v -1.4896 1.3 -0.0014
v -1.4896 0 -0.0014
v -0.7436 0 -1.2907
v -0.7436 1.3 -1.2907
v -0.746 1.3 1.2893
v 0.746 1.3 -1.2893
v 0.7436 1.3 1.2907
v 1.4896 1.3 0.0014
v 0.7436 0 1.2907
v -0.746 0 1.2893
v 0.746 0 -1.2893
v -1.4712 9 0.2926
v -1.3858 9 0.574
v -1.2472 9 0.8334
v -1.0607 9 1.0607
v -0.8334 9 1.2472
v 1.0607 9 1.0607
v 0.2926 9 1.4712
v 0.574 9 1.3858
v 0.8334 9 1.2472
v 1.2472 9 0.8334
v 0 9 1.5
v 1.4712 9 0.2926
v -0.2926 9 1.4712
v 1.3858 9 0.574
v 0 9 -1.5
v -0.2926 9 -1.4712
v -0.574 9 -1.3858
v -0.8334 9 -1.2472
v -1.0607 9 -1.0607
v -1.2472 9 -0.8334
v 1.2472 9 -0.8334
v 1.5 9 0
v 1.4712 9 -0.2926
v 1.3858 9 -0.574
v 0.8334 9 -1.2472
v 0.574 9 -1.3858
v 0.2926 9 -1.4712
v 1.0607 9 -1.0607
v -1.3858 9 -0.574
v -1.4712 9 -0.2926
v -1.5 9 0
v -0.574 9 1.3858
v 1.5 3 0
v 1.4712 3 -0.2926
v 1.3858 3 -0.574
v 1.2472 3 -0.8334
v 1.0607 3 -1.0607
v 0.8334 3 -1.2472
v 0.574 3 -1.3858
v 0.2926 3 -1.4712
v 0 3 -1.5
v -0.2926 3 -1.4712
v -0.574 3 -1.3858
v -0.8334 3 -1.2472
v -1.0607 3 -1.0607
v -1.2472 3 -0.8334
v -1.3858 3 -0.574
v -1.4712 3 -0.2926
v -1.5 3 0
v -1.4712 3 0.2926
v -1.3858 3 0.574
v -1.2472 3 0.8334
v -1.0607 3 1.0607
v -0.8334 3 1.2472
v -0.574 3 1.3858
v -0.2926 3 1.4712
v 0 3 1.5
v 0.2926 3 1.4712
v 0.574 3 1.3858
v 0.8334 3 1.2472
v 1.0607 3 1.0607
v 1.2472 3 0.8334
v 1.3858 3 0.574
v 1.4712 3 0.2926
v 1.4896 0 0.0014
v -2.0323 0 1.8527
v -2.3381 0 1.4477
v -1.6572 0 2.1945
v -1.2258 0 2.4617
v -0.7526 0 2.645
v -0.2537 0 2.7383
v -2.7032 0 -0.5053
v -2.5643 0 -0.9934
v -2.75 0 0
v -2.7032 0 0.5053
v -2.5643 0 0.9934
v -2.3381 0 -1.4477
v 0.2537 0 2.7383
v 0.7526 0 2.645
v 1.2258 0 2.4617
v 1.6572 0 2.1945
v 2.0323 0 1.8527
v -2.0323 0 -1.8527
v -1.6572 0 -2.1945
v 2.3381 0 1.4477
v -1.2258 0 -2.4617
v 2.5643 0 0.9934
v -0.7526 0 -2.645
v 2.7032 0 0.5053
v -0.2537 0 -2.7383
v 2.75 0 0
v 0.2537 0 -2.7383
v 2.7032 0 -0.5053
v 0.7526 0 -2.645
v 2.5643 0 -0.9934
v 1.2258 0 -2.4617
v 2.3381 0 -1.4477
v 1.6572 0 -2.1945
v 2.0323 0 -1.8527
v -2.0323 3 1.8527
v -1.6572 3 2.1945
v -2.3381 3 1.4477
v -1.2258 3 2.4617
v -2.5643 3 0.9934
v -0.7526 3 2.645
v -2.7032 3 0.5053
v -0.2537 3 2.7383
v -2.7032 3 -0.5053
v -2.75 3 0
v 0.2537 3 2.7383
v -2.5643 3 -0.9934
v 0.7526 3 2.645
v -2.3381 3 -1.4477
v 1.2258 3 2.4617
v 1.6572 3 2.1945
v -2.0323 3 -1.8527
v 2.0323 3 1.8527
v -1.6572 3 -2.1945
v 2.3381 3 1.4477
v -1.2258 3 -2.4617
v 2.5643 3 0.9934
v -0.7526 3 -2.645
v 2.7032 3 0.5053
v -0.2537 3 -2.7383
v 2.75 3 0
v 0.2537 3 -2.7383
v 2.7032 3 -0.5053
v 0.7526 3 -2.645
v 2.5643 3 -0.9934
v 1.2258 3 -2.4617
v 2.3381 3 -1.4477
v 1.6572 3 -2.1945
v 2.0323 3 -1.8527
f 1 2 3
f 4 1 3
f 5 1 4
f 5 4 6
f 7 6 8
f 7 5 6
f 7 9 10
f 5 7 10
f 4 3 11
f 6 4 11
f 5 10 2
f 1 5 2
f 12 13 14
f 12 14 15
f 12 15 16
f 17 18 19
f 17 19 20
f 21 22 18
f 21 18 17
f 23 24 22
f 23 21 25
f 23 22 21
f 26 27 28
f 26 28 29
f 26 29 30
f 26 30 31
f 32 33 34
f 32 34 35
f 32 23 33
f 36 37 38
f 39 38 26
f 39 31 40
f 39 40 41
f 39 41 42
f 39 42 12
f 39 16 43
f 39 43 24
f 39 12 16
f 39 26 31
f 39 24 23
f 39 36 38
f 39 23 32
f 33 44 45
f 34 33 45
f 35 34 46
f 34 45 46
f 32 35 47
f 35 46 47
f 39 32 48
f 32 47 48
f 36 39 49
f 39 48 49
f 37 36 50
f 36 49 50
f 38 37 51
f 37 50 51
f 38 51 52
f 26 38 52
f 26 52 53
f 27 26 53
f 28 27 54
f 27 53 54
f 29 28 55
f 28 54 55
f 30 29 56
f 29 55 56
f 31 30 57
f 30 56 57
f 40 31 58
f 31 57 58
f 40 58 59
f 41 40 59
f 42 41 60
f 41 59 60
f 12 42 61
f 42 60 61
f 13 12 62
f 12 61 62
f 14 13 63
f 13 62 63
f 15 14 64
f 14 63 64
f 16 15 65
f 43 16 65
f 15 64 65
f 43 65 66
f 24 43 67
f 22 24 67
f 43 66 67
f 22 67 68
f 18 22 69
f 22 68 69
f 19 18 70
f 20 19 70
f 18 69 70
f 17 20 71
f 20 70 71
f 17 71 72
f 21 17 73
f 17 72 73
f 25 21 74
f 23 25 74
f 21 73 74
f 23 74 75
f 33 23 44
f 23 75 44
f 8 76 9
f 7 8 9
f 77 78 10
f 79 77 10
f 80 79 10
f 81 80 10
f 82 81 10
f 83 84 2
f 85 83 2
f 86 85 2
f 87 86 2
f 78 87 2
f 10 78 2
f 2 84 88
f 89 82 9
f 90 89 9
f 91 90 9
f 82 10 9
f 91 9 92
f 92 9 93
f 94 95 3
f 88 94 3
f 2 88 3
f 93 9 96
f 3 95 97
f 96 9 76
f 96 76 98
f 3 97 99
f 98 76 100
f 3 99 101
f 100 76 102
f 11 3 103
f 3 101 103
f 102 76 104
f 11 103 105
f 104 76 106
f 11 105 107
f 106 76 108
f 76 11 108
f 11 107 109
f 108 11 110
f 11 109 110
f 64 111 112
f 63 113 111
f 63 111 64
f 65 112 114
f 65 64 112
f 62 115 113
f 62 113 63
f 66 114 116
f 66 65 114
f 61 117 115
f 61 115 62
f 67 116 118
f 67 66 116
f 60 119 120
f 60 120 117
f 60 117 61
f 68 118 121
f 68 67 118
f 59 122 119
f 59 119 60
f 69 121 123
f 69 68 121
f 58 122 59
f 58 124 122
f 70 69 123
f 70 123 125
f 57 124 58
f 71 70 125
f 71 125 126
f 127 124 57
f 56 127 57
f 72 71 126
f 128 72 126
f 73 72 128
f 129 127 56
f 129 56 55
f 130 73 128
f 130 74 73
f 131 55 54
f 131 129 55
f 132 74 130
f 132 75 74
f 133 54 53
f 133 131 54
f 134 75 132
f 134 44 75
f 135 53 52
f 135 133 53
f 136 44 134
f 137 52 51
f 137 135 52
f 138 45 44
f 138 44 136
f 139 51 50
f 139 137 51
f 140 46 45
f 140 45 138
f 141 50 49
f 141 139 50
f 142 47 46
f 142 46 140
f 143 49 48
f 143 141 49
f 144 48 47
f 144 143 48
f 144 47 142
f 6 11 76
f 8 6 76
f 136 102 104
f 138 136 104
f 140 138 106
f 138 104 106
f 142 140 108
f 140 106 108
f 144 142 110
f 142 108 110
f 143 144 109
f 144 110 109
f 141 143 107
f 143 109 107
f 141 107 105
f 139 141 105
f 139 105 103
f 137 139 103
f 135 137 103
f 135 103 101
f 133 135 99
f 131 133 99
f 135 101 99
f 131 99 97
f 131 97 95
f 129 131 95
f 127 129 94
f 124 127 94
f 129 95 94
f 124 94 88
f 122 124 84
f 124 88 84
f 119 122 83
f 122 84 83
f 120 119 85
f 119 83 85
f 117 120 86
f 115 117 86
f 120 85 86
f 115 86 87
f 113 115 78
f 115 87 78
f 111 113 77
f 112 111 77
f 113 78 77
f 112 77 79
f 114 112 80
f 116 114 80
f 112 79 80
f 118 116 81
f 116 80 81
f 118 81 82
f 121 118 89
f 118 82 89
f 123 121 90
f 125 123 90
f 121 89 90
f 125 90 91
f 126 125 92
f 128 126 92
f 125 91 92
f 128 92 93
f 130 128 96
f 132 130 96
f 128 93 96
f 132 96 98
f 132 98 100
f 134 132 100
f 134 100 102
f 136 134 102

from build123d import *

# Parameters (mm, degrees)
SKETCH_1_R          = 2.75
EXTRUDE_1_DEPTH     = 3
SKETCH_2_R          = 1.5
EXTRUDE_2_DEPTH     = 6
CUT_EXTRUDE_1_DEPTH = 1.3


with BuildPart() as part:
    # 草图1 → 凸台-拉伸1 (new body)
    with BuildSketch(Plane(origin=(0, 0, 0), x_dir=(1, 0, 0), z_dir=(0, 1, 0))):
        Circle(SKETCH_1_R)
    extrude(amount=EXTRUDE_1_DEPTH)

    # 草图2 → 凸台-拉伸2 (add)
    with BuildSketch(Plane(origin=(0, 3, 0), x_dir=(1, 0, 0), z_dir=(0, 1, 0))):
        Circle(SKETCH_2_R)
    extrude(amount=EXTRUDE_2_DEPTH)

    # 草图3 → 切除-拉伸1 (cut)
    with BuildSketch(Plane.XZ):
        Polygon((0.743601936, 1.290680503), (-0.745961136, 1.289318418), (-1.489563072, -0.001362085), (-0.743601936, -1.290680503), (0.745961136, -1.289318418), (1.489563072, 0.001362085), align=None)
    extrude(amount=-CUT_EXTRUDE_1_DEPTH, mode=Mode.SUBTRACT)


solid = part.part
